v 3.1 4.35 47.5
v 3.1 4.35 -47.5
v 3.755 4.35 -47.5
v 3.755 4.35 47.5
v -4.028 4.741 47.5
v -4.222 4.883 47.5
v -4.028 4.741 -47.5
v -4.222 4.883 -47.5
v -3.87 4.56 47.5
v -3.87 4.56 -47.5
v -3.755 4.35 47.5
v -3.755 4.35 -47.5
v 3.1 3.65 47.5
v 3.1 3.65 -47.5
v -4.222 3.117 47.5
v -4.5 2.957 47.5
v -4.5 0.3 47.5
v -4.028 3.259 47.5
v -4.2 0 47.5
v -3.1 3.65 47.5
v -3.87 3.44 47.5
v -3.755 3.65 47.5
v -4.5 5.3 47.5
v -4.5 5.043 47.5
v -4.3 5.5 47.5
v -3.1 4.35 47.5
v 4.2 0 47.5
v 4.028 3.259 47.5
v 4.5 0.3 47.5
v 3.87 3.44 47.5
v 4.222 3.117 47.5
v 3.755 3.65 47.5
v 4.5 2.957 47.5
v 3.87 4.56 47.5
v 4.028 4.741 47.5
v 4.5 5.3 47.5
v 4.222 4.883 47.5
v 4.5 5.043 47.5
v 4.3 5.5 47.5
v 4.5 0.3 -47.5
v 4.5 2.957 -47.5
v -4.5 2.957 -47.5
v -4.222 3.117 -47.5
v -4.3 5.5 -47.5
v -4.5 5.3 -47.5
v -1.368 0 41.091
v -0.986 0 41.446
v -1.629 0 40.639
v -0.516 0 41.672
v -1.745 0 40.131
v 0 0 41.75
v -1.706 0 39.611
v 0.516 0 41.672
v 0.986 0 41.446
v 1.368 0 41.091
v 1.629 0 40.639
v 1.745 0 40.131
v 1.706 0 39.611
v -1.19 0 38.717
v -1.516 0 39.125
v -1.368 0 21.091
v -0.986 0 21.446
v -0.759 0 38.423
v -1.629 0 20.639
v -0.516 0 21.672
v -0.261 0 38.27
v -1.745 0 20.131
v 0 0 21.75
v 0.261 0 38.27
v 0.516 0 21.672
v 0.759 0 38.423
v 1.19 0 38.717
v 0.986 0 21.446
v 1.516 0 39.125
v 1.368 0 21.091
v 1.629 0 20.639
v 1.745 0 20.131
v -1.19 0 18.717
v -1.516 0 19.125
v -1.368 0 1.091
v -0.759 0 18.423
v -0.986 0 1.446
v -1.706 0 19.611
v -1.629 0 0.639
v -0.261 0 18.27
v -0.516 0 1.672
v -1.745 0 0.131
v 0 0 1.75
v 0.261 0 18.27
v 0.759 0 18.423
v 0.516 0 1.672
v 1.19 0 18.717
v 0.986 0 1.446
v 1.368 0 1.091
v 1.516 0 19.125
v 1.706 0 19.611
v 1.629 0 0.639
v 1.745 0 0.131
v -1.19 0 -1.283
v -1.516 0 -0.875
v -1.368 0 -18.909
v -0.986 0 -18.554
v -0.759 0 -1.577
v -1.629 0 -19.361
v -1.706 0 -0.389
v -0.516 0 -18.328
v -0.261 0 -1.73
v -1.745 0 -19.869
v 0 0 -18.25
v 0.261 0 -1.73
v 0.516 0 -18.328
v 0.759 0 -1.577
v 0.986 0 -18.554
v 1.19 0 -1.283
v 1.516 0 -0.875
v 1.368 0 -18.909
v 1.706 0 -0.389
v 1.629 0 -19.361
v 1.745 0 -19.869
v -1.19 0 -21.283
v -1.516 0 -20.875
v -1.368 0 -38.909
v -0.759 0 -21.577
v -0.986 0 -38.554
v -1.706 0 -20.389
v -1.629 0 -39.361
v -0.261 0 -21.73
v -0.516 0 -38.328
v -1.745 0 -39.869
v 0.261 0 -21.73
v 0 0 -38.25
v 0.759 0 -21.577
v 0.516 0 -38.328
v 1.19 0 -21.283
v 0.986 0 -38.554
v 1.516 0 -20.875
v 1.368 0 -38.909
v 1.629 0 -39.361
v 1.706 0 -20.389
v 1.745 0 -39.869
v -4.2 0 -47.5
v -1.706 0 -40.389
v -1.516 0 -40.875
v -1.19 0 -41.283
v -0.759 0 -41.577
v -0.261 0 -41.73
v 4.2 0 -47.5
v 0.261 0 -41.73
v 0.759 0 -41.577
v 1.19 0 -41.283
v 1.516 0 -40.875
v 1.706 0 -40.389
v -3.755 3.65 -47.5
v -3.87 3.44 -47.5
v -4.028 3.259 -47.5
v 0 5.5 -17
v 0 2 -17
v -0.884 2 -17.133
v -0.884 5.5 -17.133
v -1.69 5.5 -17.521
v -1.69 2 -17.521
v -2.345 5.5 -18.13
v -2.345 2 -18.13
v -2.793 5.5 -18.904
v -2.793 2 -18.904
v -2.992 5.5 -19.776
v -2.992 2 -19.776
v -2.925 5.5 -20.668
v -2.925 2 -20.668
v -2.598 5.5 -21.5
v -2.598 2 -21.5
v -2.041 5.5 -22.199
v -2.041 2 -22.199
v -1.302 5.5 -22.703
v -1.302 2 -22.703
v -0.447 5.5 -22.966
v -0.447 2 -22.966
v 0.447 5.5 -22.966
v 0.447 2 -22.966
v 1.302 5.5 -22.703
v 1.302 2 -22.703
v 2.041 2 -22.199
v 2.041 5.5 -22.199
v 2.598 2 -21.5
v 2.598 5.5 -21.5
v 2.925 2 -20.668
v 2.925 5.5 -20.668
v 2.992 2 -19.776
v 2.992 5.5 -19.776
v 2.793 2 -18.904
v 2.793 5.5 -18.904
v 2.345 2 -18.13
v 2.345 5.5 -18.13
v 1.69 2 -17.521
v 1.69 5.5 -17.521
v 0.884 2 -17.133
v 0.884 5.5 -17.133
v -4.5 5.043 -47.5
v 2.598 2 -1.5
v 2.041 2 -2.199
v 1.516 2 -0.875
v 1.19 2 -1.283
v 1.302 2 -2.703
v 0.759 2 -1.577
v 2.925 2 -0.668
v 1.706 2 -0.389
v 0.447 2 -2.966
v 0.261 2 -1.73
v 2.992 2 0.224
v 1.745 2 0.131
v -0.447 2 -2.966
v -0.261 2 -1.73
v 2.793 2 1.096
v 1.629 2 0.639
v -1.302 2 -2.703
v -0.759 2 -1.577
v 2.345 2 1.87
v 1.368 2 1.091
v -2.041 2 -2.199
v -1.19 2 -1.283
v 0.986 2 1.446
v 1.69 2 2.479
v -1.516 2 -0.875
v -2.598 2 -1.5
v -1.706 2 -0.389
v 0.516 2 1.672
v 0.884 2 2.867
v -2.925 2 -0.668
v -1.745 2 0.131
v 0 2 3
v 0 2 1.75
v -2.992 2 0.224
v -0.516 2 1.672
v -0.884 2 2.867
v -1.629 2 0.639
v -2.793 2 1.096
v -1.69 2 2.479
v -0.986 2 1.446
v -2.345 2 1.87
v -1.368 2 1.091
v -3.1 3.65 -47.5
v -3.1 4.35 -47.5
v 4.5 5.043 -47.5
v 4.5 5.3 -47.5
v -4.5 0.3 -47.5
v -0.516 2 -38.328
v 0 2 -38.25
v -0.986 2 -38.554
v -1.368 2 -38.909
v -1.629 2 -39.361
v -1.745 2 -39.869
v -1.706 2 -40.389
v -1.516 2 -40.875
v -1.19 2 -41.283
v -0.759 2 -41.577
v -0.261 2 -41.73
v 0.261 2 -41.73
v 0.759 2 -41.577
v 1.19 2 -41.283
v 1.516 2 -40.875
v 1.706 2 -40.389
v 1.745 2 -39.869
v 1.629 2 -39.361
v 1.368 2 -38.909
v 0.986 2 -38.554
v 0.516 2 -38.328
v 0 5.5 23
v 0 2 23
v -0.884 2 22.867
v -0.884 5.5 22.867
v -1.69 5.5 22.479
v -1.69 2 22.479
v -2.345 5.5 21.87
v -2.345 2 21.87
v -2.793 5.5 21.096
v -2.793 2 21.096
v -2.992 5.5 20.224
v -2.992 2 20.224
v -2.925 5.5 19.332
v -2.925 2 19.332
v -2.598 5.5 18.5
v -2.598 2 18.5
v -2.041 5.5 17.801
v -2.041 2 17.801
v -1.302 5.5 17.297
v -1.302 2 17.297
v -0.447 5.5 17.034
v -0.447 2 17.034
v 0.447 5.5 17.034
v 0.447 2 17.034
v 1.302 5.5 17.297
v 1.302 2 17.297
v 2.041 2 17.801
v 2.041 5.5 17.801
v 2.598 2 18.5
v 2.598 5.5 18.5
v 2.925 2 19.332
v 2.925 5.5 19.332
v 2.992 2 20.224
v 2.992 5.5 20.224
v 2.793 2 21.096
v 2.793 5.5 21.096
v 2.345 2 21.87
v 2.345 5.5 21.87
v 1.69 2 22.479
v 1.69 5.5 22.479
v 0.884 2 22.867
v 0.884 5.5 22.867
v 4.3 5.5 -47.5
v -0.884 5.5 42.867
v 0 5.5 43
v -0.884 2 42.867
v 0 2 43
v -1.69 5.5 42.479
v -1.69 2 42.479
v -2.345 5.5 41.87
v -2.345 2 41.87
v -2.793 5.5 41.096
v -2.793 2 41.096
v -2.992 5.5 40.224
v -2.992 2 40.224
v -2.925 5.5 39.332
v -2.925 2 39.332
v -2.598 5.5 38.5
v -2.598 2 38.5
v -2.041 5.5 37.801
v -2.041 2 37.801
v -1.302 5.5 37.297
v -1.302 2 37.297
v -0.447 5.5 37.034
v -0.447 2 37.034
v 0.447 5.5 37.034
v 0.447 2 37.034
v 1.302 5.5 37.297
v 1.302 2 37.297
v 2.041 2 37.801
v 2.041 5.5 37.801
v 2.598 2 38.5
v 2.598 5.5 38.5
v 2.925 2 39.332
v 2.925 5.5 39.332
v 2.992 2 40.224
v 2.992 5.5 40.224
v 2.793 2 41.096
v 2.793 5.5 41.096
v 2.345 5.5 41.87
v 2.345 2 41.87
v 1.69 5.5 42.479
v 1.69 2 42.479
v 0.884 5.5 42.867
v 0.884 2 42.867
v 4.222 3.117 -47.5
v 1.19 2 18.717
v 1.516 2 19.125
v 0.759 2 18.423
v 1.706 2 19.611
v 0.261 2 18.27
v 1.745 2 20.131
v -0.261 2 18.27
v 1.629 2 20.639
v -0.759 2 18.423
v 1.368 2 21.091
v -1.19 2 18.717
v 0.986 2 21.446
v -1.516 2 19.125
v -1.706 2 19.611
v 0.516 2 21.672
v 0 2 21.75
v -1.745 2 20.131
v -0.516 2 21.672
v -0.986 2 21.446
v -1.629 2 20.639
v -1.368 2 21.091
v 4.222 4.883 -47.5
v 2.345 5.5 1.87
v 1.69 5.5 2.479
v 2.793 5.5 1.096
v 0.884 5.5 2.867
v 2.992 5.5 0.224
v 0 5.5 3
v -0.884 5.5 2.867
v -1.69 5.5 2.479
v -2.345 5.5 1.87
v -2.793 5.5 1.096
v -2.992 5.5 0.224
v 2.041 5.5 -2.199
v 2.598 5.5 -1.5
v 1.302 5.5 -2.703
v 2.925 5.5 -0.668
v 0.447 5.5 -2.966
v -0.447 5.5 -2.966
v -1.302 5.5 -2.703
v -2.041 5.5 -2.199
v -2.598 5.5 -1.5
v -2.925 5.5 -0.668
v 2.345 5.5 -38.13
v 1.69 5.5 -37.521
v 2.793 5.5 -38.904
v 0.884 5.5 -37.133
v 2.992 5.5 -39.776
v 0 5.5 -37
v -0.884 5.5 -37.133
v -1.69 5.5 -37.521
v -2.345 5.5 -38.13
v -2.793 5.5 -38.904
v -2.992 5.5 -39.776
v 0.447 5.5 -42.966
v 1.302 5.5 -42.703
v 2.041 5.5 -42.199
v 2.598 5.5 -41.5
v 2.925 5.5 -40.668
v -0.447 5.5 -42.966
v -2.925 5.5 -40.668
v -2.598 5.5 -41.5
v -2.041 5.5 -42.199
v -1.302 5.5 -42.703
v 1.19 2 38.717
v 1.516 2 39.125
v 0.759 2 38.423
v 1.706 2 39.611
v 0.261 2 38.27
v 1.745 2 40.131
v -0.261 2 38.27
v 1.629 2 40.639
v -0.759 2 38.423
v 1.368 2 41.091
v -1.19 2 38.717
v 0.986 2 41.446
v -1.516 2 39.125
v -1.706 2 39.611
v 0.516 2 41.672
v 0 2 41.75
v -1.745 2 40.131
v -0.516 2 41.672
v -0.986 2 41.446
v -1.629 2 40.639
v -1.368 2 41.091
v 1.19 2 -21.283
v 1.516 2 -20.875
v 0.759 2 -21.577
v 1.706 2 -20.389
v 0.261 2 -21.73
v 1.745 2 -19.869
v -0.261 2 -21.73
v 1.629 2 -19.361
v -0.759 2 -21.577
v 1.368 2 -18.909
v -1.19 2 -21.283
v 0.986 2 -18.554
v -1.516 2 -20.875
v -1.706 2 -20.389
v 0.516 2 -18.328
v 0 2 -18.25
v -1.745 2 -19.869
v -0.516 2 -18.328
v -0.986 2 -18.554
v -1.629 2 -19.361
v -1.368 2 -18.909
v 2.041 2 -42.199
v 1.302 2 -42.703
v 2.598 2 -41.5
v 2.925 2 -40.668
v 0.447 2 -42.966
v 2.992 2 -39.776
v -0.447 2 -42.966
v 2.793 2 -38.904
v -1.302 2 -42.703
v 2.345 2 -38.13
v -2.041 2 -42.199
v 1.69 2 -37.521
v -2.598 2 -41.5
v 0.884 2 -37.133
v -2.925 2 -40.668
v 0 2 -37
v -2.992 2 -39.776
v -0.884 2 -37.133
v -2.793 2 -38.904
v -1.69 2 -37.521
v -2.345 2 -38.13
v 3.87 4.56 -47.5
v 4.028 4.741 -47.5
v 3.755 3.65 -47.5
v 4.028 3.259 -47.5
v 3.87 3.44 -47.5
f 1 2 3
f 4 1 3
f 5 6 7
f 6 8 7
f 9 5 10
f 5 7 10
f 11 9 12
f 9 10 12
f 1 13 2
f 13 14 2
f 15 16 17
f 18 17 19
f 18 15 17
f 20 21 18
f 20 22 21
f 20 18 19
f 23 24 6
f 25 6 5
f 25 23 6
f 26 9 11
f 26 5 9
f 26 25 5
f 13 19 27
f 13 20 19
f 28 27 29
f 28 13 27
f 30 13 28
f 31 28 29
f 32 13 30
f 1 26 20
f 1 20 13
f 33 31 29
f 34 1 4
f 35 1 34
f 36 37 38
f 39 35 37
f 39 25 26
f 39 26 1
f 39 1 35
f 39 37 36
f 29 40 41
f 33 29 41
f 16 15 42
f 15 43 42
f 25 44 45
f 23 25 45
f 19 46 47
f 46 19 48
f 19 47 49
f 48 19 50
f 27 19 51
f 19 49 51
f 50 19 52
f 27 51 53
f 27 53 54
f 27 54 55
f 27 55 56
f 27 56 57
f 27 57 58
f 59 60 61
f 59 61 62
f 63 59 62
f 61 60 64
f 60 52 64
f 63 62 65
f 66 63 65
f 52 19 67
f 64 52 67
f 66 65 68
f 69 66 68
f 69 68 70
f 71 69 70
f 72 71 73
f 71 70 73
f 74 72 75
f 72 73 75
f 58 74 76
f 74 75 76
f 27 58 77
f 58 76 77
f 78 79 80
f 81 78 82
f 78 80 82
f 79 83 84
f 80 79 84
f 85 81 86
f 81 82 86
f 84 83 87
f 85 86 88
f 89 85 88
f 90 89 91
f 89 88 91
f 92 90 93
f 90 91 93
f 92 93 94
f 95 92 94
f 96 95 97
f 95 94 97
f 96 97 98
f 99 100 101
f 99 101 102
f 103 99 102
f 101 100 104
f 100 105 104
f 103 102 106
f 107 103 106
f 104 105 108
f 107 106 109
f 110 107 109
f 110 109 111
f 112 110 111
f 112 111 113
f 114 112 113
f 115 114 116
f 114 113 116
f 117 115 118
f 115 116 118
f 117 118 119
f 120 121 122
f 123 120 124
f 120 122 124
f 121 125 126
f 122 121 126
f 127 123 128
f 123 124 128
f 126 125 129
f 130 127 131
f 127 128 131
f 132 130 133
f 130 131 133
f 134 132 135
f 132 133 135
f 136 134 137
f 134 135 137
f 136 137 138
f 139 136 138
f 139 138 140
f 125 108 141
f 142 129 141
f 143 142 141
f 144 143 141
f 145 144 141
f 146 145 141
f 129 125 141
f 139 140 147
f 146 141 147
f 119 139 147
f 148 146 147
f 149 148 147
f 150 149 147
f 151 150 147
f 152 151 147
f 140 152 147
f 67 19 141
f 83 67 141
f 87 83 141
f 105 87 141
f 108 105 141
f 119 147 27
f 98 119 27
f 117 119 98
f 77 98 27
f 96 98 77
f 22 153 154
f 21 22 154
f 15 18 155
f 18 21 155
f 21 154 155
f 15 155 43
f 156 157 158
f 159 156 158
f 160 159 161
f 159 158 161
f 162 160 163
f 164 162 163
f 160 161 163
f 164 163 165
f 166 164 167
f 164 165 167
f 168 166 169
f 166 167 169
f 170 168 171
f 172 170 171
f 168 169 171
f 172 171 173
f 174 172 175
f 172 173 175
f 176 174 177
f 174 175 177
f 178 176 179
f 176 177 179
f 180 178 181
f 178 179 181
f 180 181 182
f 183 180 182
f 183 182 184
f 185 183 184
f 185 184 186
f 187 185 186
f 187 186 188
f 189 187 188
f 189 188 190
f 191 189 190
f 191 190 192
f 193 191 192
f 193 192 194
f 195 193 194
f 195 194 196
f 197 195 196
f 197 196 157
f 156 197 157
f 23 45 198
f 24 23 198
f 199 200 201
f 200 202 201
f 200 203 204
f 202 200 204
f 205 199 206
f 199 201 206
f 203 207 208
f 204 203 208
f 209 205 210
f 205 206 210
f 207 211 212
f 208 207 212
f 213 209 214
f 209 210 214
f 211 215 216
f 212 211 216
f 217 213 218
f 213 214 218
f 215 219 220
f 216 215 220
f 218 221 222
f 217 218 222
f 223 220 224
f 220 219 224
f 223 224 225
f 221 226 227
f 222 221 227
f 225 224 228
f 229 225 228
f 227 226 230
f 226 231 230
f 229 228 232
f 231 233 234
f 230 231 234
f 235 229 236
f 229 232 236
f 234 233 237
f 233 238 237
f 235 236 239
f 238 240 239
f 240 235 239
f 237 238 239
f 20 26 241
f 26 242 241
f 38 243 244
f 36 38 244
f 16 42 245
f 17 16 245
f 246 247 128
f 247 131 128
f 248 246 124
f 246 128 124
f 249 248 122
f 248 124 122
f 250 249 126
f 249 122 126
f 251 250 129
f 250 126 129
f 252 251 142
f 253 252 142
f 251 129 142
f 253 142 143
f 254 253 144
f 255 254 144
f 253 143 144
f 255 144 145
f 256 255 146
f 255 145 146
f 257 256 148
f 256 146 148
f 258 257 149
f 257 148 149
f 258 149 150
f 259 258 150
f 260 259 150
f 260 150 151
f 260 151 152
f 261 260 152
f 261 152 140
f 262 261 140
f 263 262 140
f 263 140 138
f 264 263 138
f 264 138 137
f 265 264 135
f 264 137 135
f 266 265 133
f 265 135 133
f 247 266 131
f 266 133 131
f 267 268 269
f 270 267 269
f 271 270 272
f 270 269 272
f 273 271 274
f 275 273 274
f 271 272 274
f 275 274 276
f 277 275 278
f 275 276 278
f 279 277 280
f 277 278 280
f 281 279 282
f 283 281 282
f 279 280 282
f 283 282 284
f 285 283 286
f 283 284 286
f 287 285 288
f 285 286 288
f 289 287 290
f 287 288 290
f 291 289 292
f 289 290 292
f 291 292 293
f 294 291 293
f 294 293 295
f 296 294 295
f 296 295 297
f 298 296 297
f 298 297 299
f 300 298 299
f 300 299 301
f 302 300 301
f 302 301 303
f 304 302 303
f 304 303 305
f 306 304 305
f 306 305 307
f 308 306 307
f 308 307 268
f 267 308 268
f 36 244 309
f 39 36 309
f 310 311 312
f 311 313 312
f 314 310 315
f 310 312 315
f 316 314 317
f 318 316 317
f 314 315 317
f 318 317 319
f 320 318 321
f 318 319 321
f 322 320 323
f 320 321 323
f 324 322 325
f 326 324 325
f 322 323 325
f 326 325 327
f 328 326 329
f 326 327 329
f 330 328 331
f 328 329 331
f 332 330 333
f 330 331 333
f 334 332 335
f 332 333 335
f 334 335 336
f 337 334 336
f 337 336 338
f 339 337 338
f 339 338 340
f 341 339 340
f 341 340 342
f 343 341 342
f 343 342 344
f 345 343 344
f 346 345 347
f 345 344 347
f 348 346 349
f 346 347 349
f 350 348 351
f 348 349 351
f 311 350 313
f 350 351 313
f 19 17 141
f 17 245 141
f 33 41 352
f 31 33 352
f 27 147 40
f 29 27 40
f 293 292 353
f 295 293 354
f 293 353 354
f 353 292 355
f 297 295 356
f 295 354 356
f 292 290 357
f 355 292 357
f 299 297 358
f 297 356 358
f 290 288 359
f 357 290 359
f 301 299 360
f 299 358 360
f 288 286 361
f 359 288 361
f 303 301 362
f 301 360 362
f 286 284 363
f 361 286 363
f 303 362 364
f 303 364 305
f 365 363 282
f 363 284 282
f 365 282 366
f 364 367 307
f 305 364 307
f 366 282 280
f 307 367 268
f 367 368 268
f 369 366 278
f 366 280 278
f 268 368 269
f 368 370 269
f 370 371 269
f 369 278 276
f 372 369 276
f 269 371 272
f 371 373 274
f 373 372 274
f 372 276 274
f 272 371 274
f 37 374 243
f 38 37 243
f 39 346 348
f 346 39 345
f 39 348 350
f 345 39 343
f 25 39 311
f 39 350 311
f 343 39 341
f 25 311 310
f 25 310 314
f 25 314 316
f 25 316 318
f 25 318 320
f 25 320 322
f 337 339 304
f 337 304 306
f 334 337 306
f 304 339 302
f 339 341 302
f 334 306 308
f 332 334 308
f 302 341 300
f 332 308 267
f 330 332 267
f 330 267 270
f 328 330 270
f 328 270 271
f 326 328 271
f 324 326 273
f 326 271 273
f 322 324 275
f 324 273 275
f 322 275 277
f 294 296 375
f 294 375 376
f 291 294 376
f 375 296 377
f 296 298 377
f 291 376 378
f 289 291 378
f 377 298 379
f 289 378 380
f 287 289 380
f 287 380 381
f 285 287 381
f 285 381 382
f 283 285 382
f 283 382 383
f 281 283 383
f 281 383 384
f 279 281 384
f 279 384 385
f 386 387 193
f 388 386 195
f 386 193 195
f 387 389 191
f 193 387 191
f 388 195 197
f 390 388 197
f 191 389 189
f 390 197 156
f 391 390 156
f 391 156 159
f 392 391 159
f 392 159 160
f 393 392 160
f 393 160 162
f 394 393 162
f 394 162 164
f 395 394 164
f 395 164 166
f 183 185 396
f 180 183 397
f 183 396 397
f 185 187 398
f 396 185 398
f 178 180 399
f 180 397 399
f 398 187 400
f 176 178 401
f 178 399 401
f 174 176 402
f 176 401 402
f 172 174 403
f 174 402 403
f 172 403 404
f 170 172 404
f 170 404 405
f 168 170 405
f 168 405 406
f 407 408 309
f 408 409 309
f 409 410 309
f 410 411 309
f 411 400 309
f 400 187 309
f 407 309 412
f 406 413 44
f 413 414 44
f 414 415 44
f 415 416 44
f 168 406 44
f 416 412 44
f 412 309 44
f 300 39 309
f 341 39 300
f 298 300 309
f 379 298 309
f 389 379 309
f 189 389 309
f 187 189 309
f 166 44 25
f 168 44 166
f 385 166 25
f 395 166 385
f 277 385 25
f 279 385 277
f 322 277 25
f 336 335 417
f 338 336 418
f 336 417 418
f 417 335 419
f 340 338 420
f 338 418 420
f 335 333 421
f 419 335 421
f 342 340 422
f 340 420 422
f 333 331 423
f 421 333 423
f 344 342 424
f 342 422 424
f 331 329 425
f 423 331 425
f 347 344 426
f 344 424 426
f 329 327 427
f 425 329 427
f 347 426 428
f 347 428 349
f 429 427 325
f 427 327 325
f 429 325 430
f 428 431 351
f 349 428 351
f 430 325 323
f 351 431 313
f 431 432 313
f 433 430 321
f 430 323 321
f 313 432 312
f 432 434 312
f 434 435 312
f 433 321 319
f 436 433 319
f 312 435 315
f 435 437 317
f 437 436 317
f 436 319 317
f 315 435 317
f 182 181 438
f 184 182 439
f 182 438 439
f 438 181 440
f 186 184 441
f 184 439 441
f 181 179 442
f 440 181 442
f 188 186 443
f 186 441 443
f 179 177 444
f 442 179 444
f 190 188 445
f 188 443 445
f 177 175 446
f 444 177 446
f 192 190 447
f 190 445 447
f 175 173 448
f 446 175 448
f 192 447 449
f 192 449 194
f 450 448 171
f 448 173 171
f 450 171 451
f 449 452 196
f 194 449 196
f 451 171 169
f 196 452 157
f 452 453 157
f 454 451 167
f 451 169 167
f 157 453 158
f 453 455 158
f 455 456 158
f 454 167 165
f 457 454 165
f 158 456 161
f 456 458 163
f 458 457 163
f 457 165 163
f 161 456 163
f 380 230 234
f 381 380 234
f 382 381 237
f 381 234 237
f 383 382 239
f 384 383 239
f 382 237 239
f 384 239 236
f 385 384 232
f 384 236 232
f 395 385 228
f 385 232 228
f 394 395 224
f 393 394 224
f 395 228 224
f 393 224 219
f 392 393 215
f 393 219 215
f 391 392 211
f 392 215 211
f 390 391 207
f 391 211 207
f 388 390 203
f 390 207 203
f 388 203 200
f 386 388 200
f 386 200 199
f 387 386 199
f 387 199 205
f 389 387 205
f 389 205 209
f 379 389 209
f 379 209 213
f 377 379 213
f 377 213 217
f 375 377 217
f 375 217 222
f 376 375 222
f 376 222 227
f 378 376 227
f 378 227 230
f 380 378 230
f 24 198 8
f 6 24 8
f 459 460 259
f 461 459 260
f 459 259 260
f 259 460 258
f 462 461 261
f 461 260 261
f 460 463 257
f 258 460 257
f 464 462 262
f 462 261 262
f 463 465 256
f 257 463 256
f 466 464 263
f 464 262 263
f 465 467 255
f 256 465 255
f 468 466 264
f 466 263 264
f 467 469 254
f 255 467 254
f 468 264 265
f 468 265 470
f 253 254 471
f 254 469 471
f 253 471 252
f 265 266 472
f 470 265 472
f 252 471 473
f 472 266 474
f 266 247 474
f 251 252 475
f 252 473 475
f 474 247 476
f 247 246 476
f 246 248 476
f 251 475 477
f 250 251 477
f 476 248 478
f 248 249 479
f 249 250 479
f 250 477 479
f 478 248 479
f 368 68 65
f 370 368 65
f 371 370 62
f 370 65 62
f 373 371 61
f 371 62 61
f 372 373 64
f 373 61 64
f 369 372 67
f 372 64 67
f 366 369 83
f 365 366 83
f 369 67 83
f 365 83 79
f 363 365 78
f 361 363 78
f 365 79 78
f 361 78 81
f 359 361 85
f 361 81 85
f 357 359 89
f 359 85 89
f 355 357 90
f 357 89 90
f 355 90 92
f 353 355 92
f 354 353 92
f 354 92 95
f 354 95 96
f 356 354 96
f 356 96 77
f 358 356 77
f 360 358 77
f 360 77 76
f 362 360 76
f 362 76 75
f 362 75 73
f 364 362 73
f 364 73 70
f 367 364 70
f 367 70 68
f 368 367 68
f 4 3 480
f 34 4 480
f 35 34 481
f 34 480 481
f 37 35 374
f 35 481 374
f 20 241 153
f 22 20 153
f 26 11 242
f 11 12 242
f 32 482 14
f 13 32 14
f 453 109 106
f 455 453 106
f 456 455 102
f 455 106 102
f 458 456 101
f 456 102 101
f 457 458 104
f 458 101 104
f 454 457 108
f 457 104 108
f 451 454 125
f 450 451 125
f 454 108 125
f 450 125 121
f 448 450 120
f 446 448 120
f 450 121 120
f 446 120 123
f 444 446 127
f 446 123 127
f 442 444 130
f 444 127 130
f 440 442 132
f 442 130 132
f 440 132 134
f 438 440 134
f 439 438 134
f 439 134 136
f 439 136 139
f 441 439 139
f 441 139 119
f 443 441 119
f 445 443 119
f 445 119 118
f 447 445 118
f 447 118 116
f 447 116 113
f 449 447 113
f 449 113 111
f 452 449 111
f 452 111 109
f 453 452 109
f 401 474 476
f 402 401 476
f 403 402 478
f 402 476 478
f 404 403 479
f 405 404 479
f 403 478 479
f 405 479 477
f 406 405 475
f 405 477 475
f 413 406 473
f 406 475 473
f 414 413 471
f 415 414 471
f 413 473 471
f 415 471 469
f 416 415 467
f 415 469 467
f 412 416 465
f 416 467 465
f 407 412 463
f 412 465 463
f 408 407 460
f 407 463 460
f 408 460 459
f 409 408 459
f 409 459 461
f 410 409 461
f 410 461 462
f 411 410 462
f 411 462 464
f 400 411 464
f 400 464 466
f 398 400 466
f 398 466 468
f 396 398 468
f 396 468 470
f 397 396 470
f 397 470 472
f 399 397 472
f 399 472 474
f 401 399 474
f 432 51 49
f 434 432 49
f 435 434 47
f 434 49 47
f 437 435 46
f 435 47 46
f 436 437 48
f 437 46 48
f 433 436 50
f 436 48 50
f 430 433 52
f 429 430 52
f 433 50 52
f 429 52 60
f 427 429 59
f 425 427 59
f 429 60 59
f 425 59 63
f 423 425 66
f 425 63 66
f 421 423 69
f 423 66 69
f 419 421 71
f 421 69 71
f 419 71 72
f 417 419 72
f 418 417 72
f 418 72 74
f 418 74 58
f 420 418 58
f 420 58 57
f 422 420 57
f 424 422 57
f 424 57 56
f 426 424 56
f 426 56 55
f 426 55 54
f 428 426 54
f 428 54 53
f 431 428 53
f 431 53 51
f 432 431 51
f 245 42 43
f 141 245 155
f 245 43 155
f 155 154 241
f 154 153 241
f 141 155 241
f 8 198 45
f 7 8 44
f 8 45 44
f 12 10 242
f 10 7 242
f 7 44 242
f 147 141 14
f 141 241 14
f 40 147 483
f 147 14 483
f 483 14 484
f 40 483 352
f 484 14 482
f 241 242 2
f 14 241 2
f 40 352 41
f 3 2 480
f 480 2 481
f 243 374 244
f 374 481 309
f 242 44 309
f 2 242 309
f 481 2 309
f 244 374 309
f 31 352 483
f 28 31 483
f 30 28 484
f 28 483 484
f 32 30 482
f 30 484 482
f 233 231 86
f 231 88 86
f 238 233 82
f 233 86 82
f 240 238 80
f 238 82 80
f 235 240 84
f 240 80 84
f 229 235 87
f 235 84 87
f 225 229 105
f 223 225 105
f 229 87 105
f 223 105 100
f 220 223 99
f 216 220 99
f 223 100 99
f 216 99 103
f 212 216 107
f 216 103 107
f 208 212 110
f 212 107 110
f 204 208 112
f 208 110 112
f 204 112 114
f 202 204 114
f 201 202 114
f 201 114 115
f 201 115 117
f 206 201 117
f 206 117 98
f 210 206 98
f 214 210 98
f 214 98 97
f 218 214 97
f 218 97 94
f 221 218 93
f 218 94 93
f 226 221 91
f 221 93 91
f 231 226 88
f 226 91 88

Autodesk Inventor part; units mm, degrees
sketch "Sketch_12" plane through (0, 0, 0) normal (0, 0, 1) x (1, 0, 0)
  line L0 (-4.5, 5.3) -> (-4.5, 5.0434)
  line L1 (-4.5, 5.0434) -> (-4.2216, 4.8827)
  arc A0 (-3.7548, 4.35) -> (-4.2216, 4.8827) centre (-4.7715, 3.93) ccw
  line L2 (-3.7548, 4.35) -> (-3.1, 4.35)
  line L3 (-3.1, 4.35) -> (-3.1, 3.65)
  line L4 (-3.1, 3.65) -> (-3.7548, 3.65)
  arc A1 (-4.2216, 3.1173) -> (-3.7548, 3.65) centre (-4.7715, 4.07) ccw
  line L5 (-4.2216, 3.1173) -> (-4.5, 2.9566)
  line L6 (-4.5, 2.9566) -> (-4.5, 0.3)
  line L7 (-4.5, 0.3) -> (-4.2, 0)
  line L8 (-4.2, 0) -> (4.2, 0)
  line L9 (4.2, 0) -> (4.5, 0.3)
  line L10 (4.5, 0.3) -> (4.5, 2.9566)
  line L11 (4.5, 2.9566) -> (4.2216, 3.1173)
  arc A2 (3.7548, 3.65) -> (4.2216, 3.1173) centre (4.7715, 4.07) ccw
  line L12 (3.7548, 3.65) -> (3.1, 3.65)
  line L13 (3.1, 3.65) -> (3.1, 4.35)
  line L14 (3.1, 4.35) -> (3.7548, 4.35)
  arc A3 (4.2216, 4.8827) -> (3.7548, 4.35) centre (4.7715, 3.93) ccw
  line L15 (4.2216, 4.8827) -> (4.5, 5.0434)
  line L16 (4.5, 5.0434) -> (4.5, 5.3)
  line L17 (4.5, 5.3) -> (4.3, 5.5)
  line L18 (4.3, 5.5) -> (-4.3, 5.5)
  line L19 (-4.3, 5.5) -> (-4.5, 5.3)
extrude "Extrusion1" add sketch "Sketch_12" along normal mid plane 95
sketch "Sketch2" plane through (-4.3, 5.5, 47.5) normal (0, 1, 0) x (1, 0, 0)
  point P0 (4.3, 87.5)
hole "Hole1" at (0, 5.5, -40) direction (0, -1, 0) diameter 3.5 depth 5.5 counterbore diameter 6 counterbore depth 3.5
pattern_linear "Rectangular Pattern1" count 5 spacing 20 along (0, 0, 1) of "Hole1"
ref_plane "to_block_XY" through (0, 5.5, 0) normal (0, 0, 1) x (1, 0, 0)
ref_plane "to_block_YZ" through (0, 5.5, 0) normal (1, 0, 0) x (0, 1, 0)
ref_plane "to_block_ZX" through (0, 5.5, 0) normal (0, 1, 0) x (0, 0, 1)
properties part number "SSEBZ-MX10-95_r"
